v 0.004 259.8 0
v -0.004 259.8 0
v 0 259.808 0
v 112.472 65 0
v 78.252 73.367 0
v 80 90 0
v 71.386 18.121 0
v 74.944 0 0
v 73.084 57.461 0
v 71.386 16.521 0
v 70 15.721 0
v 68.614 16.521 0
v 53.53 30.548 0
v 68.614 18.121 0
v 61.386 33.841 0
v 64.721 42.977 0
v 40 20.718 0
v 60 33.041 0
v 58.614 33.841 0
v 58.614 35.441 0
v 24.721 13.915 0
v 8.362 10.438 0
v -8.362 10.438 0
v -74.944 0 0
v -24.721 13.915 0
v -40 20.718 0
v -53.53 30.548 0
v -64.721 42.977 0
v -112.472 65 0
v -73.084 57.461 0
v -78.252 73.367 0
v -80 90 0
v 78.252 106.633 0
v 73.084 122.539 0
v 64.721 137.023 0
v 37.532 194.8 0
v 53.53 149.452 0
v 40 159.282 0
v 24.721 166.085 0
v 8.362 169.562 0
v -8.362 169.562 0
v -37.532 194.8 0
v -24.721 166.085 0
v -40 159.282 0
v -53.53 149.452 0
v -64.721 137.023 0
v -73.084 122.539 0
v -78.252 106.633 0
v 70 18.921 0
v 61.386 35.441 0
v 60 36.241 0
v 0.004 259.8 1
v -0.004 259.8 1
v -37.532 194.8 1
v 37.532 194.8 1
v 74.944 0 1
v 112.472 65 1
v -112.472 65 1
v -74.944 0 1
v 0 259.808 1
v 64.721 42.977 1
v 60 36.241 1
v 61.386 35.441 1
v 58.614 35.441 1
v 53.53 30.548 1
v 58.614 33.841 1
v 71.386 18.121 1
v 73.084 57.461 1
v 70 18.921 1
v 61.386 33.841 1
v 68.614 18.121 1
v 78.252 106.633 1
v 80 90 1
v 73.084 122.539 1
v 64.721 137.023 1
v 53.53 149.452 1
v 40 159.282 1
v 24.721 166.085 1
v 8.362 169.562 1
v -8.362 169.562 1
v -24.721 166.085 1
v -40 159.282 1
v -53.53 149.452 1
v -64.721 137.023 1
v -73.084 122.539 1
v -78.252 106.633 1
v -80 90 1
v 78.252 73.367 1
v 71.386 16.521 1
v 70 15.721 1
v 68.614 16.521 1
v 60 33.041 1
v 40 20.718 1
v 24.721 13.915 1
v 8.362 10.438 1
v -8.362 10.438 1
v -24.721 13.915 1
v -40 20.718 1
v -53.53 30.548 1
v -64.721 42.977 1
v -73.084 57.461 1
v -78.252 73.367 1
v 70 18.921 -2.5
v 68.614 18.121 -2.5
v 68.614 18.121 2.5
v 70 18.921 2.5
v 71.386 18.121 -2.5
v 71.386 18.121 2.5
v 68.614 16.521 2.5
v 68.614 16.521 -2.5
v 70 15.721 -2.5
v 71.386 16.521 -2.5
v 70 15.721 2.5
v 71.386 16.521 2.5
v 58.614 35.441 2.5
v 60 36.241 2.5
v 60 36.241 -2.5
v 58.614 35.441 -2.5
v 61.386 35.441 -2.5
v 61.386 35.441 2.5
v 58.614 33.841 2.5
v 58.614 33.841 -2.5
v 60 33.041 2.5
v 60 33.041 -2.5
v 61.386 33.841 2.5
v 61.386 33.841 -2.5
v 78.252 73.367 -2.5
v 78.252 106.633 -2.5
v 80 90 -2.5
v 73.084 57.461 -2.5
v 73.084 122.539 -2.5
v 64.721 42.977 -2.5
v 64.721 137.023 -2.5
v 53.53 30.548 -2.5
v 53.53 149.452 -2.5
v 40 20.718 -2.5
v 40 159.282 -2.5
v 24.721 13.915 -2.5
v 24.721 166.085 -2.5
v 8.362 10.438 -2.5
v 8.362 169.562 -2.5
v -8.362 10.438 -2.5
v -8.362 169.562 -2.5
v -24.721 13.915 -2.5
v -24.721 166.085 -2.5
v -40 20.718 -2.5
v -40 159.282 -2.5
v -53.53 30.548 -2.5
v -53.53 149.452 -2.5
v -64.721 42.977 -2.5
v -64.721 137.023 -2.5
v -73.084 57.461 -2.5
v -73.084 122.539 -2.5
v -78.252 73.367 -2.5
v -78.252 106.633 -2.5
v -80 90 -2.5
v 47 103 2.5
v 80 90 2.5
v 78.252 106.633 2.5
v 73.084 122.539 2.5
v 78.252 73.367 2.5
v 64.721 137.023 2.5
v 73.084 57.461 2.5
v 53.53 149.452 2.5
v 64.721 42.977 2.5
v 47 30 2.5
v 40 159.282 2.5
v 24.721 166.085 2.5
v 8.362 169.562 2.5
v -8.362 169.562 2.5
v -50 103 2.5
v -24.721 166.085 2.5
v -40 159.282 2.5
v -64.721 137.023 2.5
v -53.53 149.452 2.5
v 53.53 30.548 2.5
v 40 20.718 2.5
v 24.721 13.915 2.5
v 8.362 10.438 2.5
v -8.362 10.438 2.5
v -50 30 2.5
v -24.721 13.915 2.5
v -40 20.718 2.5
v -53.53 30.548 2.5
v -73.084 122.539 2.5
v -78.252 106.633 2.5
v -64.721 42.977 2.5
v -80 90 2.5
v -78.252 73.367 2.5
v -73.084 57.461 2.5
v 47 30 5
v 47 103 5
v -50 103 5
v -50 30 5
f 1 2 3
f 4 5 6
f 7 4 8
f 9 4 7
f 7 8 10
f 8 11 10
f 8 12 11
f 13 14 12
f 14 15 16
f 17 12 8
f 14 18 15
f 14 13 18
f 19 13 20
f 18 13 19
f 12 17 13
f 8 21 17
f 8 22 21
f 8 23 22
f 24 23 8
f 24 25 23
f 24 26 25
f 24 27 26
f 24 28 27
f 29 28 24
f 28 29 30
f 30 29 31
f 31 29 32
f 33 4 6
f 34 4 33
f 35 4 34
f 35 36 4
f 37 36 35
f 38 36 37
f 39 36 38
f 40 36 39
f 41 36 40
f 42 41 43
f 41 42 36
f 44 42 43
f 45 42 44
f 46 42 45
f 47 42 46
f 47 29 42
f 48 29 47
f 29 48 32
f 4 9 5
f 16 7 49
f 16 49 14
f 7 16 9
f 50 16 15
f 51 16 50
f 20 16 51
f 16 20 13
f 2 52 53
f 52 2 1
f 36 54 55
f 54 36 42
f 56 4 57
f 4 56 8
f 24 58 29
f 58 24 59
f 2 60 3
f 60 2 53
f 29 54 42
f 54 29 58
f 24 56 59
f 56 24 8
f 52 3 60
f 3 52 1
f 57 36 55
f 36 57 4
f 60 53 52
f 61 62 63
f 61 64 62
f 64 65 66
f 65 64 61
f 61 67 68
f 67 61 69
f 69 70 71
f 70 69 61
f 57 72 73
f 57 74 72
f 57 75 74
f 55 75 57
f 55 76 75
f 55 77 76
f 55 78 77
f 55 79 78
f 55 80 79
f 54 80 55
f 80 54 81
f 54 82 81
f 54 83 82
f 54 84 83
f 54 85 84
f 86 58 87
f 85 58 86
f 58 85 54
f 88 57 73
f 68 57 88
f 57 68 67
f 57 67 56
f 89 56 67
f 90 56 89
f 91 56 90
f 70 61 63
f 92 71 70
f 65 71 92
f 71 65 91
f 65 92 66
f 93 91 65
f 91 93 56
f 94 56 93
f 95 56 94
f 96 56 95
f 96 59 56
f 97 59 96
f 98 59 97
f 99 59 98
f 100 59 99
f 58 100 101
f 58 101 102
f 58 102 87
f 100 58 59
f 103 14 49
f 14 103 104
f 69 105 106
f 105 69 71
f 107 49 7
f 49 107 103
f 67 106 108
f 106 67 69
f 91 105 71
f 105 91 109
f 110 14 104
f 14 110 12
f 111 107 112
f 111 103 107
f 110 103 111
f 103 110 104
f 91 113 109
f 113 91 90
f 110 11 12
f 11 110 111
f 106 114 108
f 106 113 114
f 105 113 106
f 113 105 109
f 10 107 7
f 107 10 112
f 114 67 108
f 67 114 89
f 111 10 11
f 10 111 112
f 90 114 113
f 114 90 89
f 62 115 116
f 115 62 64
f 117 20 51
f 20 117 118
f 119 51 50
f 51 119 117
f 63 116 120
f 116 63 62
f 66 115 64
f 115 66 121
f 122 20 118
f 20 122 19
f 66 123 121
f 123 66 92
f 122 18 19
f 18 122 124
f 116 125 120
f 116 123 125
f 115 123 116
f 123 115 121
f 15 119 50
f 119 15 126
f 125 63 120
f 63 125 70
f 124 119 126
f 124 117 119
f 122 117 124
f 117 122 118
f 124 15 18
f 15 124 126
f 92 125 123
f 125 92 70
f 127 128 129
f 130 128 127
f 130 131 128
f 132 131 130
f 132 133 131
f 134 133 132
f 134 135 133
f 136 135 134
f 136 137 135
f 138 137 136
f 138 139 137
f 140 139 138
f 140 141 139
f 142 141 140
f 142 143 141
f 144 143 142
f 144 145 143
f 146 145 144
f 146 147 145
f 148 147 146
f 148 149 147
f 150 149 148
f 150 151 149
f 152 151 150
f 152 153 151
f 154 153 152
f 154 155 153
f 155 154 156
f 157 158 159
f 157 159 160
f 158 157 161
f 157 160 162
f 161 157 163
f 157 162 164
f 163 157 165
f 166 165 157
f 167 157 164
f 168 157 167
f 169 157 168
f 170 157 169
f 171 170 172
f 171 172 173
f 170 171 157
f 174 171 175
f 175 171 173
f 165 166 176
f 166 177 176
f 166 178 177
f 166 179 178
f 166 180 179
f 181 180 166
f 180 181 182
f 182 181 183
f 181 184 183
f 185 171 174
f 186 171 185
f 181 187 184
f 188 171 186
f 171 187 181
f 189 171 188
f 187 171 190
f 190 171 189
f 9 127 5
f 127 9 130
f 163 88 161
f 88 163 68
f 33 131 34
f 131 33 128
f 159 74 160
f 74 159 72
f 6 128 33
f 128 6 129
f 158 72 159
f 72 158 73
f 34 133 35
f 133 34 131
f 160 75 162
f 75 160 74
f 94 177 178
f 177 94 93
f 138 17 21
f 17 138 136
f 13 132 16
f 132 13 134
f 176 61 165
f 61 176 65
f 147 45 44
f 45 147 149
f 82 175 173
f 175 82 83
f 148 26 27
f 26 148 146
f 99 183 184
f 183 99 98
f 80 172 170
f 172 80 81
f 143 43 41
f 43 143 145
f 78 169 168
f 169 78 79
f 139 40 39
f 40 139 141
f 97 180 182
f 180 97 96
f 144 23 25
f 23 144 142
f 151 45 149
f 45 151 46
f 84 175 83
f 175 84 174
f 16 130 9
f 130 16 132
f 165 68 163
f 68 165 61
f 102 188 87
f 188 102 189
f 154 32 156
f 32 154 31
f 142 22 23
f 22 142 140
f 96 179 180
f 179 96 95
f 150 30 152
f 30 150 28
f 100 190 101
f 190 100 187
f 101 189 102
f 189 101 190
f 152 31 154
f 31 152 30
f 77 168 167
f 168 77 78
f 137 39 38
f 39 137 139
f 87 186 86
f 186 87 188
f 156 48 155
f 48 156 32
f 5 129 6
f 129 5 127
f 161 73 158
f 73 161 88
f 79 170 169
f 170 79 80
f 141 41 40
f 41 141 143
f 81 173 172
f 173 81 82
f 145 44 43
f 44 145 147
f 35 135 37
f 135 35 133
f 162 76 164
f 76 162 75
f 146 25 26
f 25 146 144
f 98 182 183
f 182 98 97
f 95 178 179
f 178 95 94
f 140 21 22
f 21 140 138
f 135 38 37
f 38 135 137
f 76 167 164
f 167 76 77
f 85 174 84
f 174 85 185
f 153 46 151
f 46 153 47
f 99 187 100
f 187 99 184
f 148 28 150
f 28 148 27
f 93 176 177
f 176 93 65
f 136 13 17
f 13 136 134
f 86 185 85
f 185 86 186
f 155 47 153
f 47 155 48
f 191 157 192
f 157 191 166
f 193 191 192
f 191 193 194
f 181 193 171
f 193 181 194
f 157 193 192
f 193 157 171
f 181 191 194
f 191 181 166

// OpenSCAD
// file: triangles.scad
/*
Triangles.scad
 Author: Tim Koopman
 https://github.com/tkoopman/Delta-Diamond/blob/master/OpenSCAD/Triangles.scad

         angleCA
           /|\
        a / H \ c
         /  |  \
 angleAB ------- angleBC
            b

Standard Parameters
	center: true/false
		If true same as centerXYZ = [true, true, true]

	centerXYZ: Vector of 3 true/false values [CenterX, CenterY, CenterZ]
		center must be left undef

	height: The 3D height of the Triangle. Ignored if heights defined

	heights: Vector of 3 height values heights @ [angleAB, angleBC, angleCA]
		If CenterZ is true each height will be centered individually, this means
		the shape will be different depending on CenterZ. Most times you will want
		CenterZ to be true to get the shape most people want.
*/

/* 
Triangle
	a: Length of side a
	b: Length of side b
	angle: angle at point angleAB
*/
module Triangle(
			a, b, angle, height=1, heights=undef,
			center=undef, centerXYZ=[false,false,false])
{
	// Calculate Heights at each point
	heightAB = ((heights==undef) ? height : heights[0])/2;
	heightBC = ((heights==undef) ? height : heights[1])/2;
	heightCA = ((heights==undef) ? height : heights[2])/2;
	centerZ = (center || (center==undef && centerXYZ[2]))?0:max(heightAB,heightBC,heightCA);

	// Calculate Offsets for centering
	offsetX = (center || (center==undef && centerXYZ[0]))?((cos(angle)*a)+b)/3:0;
	offsetY = (center || (center==undef && centerXYZ[1]))?(sin(angle)*a)/3:0;
	
	pointAB1 = [-offsetX,-offsetY, centerZ-heightAB];
	pointAB2 = [-offsetX,-offsetY, centerZ+heightAB];
	pointBC1 = [b-offsetX,-offsetY, centerZ-heightBC];
	pointBC2 = [b-offsetX,-offsetY, centerZ+heightBC];
	pointCA1 = [(cos(angle)*a)-offsetX,(sin(angle)*a)-offsetY, centerZ-heightCA];
	pointCA2 = [(cos(angle)*a)-offsetX,(sin(angle)*a)-offsetY, centerZ+heightCA];

	polyhedron(
		points=[	pointAB1, pointBC1, pointCA1,
					pointAB2, pointBC2, pointCA2 ],
		triangles=[	
			[0, 1, 2],
			[3, 5, 4],
			[0, 3, 1],
			[1, 3, 4],
			[1, 4, 2],
			[2, 4, 5],
			[2, 5, 0],
			[0, 5, 3] ] );
}

/*
Isosceles Triangle
	Exactly 2 of the following paramaters must be defined.
	If all 3 defined H will be ignored.
	b: length of side b
	angle: angle at points angleAB & angleBC.
*/
module Isosceles_Triangle(
			b, angle, H=undef, height=1, heights=undef,
			center=undef, centerXYZ=[true, false, false])
{
	valid = 	(angle!=undef)?((angle < 90) && (b!=undef||H!=undef)) : (b!=undef&&H!=undef);
	ANGLE = (angle!=undef) ? angle : atan(H / (b/2));
	a = (b==undef)?(H/sin((180-(angle*2))/2)) : 
		 (b / cos(ANGLE))/2;
	B = (b==undef)? (cos(angle)*a)*2:b;
	if (valid)
	{
		Triangle(a=a, b=B, angle=ANGLE, height=height, heights=heights,
					center=center, centerXYZ=centerXYZ);
	} else {
		echo("Invalid Isosceles_Triangle. Must specify any 2 of b, angle and H, and if angle used angle must be less than 90");
	}
}

/*
Right Angled Triangle
	Create a Right Angled Triangle where the hypotenuse will be calculated.

       |\
      a| \
       |  \
       ----
         b
	a: length of side a
	b: length of side b
*/
module Right_Angled_Triangle(
			a, b, height=1, heights=undef,
			center=undef, centerXYZ=[false, false, false])
{
	Triangle(a=a, b=b, angle=90, height=height, heights=heights,
				center=center, centerXYZ=centerXYZ);
}

/*
Wedge
	Is same as Right Angled Triangle with 2 different heights, and rotated.
	Good for creating support structures.
*/
module Wedge(a, b, w1, w2)
{
	rotate([90,0,0])
		Right_Angled_Triangle(a, b, heights=[w1, w2, w1], centerXYZ=[false, false, true]);
}

/*
Equilateral Triangle
	Create a Equilateral Triangle.

	l: Length of all sides (a, b & c)
	H: Triangle size will be based on the this 2D height
		When using H, l is ignored.
*/
module Equilateral_Triangle(
			l=10, H=undef, height=1, heights=undef,
			center=undef, centerXYZ=[true,false,false])
{
	L = (H==undef)?l:H/sin(60);
	Triangle(a=L,b=L,angle=60,height=height, heights=heights,
				center=center, centerXYZ=centerXYZ);
}

/*
Trapezoid
	Create a Basic Trapezoid (Based on Isosceles_Triangle)

            d
          /----\
         /  |   \
     a  /   H    \ c
       /    |     \
 angle ------------ angle
            b

	b: Length of side b
	angle: Angle at points angleAB & angleBC
	H: The 2D height at which the triangle should be cut to create the trapezoid
	heights: If vector of size 3 (Standard for triangles) both cd & da will be the same height, if vector have 4 values [ab,bc,cd,da] than each point can have different heights.
*/
module Trapezoid(
			b, angle=60, H, height=1, heights=undef,
			center=undef, centerXYZ=[true,false,false])
{
	validAngle = (angle < 90);
	adX = H / tan(angle);

	// Calculate Heights at each point
	heightAB = ((heights==undef) ? height : heights[0])/2;
	heightBC = ((heights==undef) ? height : heights[1])/2;
	heightCD = ((heights==undef) ? height : heights[2])/2;
	heightDA = ((heights==undef) ? height : ((len(heights) > 3)?heights[3]:heights[2]))/2;

	// Centers
	centerX = (center || (center==undef && centerXYZ[0]))?0:b/2;
	centerY = (center || (center==undef && centerXYZ[1]))?0:H/2;
	centerZ = (center || (center==undef && centerXYZ[2]))?0:max(heightAB,heightBC,heightCD,heightDA);

	// Points
	y = H/2;
	bx = b/2;
	dx = (b-(adX*2))/2;

	pointAB1 = [centerX-bx, centerY-y, centerZ-heightAB];
	pointAB2 = [centerX-bx, centerY-y, centerZ+heightAB];
	pointBC1 = [centerX+bx, centerY-y, centerZ-heightBC];
	pointBC2 = [centerX+bx, centerY-y, centerZ+heightBC];
	pointCD1 = [centerX+dx, centerY+y, centerZ-heightCD];
	pointCD2 = [centerX+dx, centerY+y, centerZ+heightCD];
	pointDA1 = [centerX-dx, centerY+y, centerZ-heightDA];
	pointDA2 = [centerX-dx, centerY+y, centerZ+heightDA];

	validH = (adX < b/2);

	if (validAngle && validH)
	{
		polyhedron(
			points=[	pointAB1, pointBC1, pointCD1, pointDA1,
						pointAB2, pointBC2, pointCD2, pointDA2 ],
			triangles=[	
				[0, 1, 2],
				[0, 2, 3],
				[4, 6, 5],
				[4, 7, 6],
				[0, 4, 1],
				[1, 4, 5],
				[1, 5, 2],
				[2, 5, 6],
				[2, 6, 3],
				[3, 6, 7],
				[3, 7, 0],
				[0, 7, 4]	] );
	} else {
		if (!validAngle) echo("Trapezoid invalid, angle must be less than 90");
		else echo("Trapezoid invalid, H is larger than triangle");
	}
}
// main file
use <triangles.scad>

difference(){
    Equilateral_Triangle(l=300,h=3);
     union(){
        translate([0,259.8-65,0]) translate([-150/2,0,0]) cube([150,65,5]);
        translate([150,0,0]) rotate([0,0,60]) translate([-150/2,0,0]) cube([150,65,5]);
        translate([-150,0,0]) rotate([0,0,-60]) translate([-150/2,0,0]) cube([150,65,5]);
    }
} 
translate([80,0,0]){
    rotate([0,0,30]){
        for(j=[1:5]){
            translate([0,(100/5)*j,0]) cylinder(r=3.2/2,h=5,center=true);
        }
    }
}

color([1,0,0]) translate([0,90,0])  cylinder(r=80,h=5,center=true);

color([1,0,0]) translate([-50,30,0]) cube([97,73,5]);
